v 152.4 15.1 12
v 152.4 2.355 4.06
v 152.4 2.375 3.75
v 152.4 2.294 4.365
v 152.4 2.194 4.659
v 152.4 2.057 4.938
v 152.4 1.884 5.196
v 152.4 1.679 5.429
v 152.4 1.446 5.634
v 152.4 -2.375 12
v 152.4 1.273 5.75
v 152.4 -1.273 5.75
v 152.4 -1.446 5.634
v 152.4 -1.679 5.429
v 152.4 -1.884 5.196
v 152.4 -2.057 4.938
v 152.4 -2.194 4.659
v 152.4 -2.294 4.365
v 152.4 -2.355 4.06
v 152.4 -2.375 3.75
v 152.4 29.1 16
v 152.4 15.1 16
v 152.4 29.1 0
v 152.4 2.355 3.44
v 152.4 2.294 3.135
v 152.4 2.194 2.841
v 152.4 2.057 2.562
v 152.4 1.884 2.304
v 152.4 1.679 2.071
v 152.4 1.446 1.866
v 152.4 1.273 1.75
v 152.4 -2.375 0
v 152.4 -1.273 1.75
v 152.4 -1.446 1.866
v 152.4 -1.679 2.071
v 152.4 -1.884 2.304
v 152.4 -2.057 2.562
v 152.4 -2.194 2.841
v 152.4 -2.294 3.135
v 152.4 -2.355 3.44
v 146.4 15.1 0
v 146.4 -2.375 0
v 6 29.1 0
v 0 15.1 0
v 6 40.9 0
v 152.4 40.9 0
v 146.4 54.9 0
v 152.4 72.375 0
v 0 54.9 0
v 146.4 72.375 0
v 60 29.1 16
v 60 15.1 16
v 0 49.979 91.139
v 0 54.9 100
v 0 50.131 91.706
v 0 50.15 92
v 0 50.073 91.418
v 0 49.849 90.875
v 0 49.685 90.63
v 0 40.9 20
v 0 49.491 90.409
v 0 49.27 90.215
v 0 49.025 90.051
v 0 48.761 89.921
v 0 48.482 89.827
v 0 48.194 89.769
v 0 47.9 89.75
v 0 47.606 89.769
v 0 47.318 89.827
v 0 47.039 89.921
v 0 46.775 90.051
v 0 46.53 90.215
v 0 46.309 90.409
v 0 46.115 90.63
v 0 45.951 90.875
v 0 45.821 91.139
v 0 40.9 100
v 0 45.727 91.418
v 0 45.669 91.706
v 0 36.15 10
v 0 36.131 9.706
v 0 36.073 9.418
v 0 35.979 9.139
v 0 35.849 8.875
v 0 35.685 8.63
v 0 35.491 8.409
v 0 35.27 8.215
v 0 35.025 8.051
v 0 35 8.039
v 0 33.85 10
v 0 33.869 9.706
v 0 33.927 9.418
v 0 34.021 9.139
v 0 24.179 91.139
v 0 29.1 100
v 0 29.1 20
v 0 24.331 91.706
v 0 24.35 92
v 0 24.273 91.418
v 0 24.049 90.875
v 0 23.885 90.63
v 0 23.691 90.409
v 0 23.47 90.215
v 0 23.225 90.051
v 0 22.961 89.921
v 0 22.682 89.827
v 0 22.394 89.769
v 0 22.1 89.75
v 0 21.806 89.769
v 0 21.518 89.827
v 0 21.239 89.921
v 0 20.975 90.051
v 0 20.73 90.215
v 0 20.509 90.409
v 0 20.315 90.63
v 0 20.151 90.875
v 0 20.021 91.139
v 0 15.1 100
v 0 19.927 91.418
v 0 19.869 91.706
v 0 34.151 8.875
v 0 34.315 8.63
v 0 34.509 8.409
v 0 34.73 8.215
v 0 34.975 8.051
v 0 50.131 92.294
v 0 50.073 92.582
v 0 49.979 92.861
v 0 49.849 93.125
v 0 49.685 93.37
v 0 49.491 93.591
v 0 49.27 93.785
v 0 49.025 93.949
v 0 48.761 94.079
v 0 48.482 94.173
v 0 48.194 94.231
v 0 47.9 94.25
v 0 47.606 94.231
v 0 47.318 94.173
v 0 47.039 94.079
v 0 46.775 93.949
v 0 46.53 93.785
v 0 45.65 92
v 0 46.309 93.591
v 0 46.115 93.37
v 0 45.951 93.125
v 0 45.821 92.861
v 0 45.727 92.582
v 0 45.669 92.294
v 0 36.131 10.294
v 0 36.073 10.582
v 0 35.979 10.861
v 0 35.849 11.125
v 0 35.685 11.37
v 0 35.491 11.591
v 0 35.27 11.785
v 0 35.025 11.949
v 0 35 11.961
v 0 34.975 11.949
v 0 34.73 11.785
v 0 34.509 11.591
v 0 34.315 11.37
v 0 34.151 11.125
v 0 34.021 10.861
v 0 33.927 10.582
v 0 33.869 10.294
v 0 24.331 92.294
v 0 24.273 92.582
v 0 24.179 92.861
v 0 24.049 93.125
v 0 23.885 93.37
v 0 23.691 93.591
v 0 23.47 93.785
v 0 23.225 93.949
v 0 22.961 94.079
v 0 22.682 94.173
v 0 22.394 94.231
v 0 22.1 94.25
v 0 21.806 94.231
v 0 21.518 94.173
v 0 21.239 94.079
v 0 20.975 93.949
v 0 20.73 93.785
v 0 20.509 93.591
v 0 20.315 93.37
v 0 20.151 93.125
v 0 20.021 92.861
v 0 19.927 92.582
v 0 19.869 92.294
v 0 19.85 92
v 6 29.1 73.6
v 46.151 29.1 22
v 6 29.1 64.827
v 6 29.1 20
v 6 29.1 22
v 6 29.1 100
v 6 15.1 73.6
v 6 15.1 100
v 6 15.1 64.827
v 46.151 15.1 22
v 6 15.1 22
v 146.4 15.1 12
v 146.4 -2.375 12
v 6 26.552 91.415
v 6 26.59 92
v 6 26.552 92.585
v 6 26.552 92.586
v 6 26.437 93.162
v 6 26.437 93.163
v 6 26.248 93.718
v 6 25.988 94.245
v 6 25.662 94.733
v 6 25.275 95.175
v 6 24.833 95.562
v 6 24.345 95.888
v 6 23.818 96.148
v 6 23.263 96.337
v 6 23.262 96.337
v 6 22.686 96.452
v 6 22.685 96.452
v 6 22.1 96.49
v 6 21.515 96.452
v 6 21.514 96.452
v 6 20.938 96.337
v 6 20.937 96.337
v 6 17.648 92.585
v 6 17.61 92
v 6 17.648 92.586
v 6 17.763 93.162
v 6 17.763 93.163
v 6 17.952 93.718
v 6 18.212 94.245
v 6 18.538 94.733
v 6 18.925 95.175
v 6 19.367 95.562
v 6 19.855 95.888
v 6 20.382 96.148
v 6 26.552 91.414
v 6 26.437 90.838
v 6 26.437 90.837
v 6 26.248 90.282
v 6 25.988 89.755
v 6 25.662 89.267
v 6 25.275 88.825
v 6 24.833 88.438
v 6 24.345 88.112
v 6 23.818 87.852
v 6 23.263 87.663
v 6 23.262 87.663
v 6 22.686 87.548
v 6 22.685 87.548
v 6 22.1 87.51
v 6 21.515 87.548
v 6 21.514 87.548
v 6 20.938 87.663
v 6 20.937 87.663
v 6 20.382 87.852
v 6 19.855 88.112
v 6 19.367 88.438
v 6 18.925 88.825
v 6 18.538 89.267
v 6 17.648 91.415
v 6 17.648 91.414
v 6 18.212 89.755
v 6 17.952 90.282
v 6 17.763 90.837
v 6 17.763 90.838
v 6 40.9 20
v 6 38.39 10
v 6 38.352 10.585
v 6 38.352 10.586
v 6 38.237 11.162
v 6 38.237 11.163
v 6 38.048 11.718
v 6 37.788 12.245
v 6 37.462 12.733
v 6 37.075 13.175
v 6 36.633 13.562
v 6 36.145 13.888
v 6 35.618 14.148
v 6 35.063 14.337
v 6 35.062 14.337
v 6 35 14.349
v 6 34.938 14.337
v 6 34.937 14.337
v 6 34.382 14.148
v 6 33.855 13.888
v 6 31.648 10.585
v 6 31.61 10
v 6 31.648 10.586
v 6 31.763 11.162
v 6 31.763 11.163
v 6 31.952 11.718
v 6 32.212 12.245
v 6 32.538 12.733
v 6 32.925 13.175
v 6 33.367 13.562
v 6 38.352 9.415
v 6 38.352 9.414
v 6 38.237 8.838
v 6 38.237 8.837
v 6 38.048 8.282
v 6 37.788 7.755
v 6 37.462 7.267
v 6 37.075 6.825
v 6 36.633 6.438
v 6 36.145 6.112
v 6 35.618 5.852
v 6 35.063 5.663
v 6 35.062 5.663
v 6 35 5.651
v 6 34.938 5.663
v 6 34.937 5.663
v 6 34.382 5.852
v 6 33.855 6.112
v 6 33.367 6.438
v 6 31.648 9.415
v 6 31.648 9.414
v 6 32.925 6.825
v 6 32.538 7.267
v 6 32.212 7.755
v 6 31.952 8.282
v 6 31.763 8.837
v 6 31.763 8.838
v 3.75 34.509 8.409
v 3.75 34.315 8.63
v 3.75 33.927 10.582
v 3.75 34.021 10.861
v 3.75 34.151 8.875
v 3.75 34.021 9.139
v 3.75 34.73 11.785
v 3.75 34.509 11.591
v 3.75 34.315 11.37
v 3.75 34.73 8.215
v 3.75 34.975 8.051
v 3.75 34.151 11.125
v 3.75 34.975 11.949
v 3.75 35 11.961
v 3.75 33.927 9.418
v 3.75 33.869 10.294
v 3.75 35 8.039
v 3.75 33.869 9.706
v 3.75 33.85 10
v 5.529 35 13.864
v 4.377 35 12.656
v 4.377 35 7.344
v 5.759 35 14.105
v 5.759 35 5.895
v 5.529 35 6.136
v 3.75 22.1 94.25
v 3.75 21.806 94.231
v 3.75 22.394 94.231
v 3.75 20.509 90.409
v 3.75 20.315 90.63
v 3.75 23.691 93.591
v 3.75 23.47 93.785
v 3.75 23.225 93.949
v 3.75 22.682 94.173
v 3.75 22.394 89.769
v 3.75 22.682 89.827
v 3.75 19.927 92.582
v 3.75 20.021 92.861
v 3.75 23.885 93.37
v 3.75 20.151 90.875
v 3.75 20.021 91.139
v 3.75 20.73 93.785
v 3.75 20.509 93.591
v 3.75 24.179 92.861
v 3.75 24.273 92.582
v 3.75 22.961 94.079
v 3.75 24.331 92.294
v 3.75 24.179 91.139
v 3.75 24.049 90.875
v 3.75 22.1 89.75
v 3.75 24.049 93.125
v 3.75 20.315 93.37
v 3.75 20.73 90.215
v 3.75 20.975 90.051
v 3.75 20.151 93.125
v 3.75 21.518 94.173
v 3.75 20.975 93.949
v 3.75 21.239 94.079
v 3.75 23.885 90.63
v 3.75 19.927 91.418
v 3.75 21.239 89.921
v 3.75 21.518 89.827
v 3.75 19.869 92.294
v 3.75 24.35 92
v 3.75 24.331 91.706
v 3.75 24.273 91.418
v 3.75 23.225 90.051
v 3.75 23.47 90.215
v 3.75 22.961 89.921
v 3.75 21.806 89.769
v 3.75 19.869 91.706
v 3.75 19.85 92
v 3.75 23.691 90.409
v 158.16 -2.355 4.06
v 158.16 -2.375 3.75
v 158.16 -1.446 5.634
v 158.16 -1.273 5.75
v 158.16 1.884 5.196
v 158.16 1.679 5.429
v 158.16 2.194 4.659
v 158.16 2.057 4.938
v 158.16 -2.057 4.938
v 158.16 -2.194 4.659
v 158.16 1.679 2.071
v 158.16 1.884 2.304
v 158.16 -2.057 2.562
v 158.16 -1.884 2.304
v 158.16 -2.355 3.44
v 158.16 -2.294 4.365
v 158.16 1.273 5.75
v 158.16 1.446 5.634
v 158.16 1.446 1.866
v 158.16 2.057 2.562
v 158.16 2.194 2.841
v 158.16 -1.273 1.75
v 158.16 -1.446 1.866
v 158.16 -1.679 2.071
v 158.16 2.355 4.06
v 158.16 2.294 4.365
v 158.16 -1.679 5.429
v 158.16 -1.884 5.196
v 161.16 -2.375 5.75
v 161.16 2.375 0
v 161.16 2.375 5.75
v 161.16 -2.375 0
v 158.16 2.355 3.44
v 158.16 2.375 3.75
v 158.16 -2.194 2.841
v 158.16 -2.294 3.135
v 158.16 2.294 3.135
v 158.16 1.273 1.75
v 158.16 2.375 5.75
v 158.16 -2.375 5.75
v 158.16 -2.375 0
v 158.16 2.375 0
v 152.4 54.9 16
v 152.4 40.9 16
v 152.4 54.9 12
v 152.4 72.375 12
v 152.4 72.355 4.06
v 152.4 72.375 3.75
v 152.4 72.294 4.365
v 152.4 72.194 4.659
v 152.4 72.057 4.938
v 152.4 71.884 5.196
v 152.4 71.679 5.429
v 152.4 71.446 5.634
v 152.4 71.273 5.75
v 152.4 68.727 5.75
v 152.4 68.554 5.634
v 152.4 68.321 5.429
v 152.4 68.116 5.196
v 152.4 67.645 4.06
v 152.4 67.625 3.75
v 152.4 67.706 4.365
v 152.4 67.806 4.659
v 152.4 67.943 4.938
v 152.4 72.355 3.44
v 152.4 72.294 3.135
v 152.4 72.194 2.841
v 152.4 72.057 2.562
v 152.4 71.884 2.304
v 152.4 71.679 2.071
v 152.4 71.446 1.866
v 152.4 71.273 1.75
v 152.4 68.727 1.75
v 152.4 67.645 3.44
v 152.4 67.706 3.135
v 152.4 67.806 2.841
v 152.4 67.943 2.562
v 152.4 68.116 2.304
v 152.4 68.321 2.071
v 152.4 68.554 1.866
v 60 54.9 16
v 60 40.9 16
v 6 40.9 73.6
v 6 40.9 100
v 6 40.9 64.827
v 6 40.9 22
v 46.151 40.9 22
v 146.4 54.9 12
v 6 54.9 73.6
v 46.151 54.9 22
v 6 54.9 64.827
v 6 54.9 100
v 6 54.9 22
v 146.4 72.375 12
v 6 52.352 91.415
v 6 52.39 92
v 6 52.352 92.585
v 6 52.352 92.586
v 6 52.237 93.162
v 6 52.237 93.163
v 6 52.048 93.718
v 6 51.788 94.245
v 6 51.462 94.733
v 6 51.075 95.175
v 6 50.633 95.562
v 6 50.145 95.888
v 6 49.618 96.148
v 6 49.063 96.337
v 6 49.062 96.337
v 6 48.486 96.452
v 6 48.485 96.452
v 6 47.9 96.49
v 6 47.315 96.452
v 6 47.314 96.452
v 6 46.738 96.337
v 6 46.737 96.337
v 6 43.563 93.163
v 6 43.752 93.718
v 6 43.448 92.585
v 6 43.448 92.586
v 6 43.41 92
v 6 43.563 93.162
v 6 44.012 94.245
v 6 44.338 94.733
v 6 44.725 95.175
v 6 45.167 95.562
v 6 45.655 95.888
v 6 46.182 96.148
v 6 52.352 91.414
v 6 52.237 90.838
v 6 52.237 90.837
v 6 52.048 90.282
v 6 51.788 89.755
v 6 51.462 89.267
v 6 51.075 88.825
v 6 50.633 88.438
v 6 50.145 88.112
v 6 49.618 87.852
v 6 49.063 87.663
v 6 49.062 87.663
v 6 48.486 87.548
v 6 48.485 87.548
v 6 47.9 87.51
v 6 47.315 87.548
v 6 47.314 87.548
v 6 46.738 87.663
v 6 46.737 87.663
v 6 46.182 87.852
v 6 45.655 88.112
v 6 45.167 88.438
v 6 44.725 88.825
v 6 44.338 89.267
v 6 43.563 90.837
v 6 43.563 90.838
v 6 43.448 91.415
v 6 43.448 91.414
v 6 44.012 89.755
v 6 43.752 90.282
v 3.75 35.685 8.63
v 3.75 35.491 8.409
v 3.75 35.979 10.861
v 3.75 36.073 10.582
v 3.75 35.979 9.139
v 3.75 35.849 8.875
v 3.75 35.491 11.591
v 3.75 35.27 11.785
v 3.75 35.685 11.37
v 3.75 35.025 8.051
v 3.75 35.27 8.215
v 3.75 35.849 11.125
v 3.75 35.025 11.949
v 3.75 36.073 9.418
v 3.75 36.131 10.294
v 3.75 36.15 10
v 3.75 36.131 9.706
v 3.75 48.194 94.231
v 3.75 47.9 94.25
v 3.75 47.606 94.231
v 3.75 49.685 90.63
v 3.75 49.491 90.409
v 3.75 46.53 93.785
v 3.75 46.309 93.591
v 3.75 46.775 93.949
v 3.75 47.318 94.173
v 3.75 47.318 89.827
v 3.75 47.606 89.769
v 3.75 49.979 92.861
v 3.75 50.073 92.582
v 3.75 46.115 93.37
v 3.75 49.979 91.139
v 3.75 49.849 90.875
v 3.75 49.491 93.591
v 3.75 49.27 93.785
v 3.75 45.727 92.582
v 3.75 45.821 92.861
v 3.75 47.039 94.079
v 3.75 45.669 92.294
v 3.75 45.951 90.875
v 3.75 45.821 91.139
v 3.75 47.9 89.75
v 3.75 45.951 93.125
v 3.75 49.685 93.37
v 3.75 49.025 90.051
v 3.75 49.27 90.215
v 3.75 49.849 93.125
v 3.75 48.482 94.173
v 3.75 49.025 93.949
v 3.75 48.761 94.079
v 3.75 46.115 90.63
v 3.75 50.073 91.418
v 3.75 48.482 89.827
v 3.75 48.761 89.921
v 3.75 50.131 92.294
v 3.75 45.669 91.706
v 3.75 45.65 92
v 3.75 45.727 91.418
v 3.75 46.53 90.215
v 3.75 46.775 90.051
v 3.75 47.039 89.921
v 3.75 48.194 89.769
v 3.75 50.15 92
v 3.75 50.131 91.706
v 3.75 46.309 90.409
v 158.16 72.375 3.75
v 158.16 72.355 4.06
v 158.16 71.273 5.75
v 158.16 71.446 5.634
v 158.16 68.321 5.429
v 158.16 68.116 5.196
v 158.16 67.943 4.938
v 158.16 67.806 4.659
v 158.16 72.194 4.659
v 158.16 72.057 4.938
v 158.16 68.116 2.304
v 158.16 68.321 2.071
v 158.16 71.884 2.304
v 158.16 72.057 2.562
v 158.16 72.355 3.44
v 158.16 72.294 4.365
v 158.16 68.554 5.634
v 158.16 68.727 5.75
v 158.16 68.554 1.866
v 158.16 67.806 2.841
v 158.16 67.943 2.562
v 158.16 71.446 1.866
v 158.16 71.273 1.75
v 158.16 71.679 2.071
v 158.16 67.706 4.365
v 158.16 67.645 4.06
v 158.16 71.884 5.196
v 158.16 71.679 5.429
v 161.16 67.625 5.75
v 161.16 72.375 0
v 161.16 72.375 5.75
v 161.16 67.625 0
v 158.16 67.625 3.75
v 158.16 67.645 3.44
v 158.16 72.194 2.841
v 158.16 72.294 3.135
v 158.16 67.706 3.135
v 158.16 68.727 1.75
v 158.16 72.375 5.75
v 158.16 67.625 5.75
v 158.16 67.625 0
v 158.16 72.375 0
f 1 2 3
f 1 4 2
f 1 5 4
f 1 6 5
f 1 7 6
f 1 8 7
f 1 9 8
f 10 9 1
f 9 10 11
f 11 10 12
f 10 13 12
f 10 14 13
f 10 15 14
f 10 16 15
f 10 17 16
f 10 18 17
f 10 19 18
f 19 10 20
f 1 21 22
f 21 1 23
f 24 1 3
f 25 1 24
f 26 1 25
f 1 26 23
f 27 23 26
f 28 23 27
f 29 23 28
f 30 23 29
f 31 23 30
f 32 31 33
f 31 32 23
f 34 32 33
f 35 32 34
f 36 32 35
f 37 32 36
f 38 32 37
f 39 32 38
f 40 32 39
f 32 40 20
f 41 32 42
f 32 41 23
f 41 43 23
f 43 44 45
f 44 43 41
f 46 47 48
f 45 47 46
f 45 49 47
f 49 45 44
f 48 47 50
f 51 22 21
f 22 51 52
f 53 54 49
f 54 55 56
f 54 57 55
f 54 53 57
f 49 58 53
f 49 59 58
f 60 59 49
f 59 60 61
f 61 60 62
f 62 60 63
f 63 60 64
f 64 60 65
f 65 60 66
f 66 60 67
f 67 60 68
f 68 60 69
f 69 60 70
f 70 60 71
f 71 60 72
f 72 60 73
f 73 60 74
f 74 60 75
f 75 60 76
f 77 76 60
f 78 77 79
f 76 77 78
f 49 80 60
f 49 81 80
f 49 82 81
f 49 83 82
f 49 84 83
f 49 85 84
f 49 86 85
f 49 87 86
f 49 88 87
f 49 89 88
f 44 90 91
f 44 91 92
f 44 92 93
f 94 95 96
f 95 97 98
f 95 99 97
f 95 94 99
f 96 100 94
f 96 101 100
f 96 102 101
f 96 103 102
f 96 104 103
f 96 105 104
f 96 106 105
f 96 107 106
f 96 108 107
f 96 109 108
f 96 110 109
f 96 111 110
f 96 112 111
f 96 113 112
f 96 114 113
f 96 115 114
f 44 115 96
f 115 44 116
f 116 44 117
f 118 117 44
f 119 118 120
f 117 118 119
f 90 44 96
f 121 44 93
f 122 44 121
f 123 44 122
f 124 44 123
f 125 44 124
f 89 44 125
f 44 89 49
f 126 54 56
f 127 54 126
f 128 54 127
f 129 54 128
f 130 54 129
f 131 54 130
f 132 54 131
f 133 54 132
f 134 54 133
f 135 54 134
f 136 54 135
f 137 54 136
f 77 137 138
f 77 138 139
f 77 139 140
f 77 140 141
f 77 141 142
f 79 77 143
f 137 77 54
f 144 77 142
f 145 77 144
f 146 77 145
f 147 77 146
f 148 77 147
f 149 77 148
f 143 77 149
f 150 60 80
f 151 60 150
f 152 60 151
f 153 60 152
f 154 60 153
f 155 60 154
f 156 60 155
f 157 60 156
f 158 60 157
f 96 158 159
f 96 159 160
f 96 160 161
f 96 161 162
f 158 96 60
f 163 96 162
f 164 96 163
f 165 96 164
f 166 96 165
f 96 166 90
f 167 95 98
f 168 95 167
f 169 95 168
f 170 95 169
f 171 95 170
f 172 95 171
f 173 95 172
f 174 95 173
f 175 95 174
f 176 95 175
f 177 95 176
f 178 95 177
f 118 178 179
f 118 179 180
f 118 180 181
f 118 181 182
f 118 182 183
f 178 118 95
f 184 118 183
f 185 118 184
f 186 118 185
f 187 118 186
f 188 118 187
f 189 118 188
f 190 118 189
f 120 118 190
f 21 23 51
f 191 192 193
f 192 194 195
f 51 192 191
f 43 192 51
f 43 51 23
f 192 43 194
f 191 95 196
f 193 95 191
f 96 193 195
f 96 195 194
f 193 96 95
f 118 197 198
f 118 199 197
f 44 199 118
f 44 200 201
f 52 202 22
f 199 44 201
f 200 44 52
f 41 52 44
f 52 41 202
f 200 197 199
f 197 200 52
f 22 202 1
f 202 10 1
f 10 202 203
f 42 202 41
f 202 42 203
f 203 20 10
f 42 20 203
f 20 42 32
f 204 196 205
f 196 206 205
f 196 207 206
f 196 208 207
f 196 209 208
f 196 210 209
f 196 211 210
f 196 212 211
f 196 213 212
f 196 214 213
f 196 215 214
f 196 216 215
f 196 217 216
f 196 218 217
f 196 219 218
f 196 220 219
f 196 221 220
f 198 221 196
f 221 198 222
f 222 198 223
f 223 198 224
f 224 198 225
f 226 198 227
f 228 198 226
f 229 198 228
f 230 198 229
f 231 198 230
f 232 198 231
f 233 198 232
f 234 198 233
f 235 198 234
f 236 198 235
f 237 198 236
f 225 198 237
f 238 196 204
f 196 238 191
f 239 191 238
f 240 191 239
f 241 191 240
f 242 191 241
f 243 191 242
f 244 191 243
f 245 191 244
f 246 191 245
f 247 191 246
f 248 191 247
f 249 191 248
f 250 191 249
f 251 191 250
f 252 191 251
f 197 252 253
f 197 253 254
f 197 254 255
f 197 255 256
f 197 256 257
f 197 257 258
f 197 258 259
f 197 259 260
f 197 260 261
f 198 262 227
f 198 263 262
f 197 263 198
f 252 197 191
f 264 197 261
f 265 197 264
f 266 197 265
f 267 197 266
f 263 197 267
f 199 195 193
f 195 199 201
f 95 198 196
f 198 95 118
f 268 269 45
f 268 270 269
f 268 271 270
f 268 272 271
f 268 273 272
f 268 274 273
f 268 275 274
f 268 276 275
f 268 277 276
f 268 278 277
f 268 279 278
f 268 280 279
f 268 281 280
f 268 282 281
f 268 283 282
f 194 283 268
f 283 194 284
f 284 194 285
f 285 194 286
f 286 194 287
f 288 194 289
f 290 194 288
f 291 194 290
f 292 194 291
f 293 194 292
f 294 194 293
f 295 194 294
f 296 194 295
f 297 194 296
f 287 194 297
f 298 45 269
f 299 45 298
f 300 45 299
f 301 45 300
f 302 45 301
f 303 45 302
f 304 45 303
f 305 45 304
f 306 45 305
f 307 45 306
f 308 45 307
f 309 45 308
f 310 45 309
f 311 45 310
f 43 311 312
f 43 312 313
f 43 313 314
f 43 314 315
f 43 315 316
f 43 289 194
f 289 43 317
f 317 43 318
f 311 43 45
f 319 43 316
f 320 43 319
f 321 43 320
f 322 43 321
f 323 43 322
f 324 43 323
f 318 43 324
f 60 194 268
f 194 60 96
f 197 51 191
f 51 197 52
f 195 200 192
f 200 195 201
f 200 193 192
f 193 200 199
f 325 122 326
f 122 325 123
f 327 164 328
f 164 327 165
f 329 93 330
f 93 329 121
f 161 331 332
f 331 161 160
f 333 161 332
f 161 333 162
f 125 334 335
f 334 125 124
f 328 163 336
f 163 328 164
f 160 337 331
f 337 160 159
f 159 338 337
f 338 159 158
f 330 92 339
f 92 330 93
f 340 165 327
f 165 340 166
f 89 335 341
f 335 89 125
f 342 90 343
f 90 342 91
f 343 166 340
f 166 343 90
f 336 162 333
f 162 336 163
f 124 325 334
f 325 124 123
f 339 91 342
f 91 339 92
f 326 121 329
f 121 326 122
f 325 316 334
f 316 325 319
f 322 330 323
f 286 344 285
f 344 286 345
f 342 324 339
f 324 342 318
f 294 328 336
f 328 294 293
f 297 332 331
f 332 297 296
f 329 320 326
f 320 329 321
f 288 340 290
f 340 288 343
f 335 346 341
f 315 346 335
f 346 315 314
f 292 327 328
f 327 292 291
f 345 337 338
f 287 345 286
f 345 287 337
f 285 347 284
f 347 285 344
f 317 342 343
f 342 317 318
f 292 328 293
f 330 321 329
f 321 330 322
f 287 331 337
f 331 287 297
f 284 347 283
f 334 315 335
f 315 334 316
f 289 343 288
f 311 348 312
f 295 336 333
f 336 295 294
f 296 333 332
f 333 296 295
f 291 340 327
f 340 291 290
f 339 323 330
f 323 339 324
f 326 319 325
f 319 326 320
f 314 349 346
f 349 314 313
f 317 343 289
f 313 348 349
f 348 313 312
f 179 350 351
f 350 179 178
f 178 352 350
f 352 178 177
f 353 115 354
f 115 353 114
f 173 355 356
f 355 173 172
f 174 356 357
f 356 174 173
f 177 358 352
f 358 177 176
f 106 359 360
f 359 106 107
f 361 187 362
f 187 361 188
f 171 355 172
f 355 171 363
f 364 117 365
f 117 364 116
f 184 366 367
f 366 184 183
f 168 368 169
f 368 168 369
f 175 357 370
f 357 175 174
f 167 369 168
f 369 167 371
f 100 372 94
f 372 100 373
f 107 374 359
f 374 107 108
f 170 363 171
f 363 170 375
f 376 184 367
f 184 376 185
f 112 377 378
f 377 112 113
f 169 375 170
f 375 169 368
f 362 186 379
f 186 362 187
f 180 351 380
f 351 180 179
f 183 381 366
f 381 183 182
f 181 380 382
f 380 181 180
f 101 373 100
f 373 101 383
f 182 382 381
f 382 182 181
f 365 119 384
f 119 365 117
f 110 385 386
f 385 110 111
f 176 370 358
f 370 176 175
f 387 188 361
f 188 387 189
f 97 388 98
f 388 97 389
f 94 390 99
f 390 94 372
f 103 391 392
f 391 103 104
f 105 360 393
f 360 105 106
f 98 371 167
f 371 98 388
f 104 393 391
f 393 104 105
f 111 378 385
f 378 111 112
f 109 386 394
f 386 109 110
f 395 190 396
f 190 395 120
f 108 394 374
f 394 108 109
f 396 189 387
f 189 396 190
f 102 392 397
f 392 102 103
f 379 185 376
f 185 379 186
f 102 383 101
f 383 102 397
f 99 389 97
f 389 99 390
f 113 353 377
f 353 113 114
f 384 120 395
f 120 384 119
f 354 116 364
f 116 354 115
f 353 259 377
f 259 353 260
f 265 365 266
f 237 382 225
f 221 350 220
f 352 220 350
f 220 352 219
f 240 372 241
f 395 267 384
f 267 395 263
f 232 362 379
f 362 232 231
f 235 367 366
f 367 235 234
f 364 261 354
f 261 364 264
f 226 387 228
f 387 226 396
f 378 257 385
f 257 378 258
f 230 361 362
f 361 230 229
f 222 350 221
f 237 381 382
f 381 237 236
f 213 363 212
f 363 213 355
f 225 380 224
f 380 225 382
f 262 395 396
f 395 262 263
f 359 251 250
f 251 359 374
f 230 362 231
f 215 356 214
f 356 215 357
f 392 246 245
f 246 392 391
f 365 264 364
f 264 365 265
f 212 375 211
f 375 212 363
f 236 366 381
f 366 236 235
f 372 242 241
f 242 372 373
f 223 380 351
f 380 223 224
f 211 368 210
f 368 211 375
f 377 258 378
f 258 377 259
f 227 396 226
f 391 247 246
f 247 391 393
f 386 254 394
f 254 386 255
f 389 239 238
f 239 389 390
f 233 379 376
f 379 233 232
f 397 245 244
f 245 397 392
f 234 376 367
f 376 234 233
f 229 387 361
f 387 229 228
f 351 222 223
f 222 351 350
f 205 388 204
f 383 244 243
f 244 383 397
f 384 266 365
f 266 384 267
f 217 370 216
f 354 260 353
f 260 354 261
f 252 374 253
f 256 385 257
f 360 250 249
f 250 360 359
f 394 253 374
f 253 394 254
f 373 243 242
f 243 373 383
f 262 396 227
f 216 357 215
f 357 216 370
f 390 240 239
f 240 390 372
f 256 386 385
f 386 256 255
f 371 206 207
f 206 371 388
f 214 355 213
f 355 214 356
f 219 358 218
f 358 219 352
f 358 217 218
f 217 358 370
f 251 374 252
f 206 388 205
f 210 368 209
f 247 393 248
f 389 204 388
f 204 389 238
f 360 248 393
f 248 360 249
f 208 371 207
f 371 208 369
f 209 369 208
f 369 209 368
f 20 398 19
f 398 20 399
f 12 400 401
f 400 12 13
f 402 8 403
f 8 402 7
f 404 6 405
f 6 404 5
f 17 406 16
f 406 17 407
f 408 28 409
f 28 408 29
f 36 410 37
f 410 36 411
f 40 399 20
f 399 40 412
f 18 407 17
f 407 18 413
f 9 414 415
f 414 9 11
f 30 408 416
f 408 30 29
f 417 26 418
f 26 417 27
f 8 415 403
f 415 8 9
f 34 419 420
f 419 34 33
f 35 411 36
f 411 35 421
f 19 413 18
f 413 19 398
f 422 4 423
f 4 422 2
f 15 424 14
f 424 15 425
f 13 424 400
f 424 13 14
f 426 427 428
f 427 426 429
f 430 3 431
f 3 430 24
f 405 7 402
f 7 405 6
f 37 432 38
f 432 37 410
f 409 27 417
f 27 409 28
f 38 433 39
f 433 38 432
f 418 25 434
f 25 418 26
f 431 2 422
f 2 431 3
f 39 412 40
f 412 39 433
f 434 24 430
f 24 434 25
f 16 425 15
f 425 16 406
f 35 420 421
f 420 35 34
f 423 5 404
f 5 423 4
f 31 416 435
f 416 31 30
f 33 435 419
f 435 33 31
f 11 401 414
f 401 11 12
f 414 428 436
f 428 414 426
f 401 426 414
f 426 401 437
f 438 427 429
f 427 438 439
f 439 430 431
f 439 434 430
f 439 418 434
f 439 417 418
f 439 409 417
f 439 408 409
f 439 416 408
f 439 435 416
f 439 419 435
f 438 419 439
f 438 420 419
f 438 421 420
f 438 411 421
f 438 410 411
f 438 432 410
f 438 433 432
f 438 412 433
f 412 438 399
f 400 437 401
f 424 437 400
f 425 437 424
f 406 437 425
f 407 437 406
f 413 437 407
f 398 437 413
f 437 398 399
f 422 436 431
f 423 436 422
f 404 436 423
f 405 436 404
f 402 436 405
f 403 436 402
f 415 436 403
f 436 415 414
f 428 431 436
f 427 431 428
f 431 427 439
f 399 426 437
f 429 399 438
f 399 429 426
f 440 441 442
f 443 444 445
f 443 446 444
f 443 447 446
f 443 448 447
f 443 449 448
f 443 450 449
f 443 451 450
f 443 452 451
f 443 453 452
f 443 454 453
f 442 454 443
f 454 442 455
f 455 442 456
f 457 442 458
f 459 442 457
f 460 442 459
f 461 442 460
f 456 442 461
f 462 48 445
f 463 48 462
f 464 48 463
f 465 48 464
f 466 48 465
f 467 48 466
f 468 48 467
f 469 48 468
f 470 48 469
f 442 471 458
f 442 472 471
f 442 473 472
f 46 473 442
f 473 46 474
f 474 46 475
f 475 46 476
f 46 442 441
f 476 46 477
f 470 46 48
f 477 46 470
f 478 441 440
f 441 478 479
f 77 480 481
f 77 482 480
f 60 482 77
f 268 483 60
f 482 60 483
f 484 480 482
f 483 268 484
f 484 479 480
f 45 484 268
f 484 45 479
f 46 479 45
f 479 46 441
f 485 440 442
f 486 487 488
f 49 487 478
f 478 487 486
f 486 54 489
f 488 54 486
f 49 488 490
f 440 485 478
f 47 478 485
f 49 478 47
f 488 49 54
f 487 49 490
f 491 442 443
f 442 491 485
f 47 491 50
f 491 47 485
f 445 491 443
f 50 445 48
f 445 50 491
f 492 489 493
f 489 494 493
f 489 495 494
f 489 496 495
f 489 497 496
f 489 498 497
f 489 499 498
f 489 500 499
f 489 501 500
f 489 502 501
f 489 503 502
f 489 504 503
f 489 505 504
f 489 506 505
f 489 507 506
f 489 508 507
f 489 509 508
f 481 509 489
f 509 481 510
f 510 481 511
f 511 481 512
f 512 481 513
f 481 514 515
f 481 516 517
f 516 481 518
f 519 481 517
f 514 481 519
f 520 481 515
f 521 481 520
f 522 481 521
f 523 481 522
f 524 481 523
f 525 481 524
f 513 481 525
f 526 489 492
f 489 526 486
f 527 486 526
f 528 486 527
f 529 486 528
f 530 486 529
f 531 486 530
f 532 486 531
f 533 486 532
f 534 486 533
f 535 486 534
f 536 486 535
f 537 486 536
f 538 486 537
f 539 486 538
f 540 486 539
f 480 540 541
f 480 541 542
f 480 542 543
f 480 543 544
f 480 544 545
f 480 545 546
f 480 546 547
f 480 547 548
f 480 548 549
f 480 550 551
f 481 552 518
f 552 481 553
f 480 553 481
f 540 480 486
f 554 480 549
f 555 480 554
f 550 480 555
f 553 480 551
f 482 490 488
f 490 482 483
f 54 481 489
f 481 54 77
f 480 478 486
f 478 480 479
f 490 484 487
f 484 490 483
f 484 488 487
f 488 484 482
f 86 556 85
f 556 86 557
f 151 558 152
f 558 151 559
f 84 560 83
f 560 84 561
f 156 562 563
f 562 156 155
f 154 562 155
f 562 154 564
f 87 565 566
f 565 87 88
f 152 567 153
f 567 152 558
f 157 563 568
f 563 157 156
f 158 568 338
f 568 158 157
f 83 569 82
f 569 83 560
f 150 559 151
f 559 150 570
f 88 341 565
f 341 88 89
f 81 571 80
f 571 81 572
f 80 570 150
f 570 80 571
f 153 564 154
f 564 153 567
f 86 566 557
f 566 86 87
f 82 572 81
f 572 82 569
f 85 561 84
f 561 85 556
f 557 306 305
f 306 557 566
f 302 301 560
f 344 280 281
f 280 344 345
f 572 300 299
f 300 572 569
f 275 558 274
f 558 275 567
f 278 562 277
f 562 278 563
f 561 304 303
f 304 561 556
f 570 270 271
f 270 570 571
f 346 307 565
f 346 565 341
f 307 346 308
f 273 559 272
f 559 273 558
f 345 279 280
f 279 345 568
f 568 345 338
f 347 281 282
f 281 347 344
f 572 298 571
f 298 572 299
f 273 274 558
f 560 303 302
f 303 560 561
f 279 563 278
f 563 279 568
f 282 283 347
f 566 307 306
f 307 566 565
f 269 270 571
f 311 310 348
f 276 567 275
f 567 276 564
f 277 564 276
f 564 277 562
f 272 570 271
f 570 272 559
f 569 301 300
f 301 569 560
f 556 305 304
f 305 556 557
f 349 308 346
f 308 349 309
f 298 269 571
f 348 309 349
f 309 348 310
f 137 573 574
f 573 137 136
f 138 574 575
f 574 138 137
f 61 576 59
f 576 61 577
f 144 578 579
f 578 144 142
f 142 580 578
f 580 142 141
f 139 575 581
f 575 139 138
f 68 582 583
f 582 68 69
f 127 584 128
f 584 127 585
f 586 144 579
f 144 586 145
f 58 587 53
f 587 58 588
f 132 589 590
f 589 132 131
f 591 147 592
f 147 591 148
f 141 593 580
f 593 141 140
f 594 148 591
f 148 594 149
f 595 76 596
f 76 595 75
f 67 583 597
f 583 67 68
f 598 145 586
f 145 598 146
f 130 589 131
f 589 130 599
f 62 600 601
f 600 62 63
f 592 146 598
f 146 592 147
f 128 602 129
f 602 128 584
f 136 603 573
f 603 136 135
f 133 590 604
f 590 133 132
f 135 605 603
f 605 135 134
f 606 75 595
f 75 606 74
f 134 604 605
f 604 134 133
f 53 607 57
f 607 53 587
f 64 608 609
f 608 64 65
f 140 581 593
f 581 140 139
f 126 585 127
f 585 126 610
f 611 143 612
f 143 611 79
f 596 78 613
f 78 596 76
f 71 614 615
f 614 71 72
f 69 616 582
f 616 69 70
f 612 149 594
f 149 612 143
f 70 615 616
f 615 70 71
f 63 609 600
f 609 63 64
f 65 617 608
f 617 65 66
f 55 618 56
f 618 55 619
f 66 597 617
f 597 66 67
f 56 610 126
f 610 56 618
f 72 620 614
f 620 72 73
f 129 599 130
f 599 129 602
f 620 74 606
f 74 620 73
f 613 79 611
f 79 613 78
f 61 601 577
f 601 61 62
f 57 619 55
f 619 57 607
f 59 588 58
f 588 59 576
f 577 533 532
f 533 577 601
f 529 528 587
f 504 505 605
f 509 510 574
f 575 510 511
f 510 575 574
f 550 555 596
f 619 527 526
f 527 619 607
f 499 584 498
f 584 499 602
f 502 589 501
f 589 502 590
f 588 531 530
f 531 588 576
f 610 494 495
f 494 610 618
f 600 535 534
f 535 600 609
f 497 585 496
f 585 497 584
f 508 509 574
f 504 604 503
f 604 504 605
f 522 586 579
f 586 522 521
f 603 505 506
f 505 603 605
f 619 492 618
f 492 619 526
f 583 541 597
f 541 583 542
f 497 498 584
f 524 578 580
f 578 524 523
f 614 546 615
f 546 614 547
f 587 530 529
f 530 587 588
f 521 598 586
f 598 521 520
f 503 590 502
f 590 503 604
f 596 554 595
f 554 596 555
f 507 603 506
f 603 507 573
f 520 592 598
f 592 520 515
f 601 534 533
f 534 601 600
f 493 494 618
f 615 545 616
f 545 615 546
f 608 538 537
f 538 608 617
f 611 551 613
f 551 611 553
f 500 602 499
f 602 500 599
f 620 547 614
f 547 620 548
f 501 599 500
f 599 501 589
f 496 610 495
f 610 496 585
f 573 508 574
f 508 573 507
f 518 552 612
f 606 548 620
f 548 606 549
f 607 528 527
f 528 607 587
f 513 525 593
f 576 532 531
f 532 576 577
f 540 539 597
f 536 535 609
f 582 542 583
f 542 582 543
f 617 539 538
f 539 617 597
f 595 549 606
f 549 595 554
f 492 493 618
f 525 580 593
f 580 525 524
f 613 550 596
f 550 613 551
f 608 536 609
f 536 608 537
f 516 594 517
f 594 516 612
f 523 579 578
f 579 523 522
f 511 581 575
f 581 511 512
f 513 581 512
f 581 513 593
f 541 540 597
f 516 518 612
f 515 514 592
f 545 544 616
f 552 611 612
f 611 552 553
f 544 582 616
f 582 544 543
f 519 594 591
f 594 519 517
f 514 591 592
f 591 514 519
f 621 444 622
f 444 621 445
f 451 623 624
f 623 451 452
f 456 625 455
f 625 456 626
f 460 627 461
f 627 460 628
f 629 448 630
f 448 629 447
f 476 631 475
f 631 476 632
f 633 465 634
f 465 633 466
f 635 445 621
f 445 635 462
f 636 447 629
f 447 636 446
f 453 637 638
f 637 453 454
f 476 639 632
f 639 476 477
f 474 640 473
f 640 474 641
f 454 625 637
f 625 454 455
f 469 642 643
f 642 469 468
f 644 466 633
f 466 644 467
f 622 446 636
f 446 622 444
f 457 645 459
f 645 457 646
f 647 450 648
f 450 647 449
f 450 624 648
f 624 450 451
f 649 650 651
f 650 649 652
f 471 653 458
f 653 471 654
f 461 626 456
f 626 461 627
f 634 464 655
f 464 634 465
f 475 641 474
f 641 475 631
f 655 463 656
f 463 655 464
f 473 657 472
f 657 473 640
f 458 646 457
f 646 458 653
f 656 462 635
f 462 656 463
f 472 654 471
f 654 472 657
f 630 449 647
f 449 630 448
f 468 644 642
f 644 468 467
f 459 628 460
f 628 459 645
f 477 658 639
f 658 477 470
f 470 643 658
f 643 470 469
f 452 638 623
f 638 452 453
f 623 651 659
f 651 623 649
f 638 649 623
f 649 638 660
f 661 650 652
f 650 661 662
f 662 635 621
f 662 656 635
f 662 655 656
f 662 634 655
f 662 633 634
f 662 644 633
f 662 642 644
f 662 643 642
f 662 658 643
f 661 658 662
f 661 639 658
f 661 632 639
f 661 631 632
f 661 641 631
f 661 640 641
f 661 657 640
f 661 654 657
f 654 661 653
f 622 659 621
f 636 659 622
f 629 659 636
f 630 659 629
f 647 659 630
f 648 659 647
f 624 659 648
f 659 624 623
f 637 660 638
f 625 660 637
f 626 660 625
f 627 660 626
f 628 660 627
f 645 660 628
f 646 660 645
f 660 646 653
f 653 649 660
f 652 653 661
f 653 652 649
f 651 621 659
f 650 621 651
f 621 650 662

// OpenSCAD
// Standoff hanger for the flip-counter board.
// Two brackets (left + right) screw to the wall and hold the board
// 6" out from it by pins through the board's two existing corner holes.
// The long arms run just outside the board's side edges so cards
// flipping over the rings never touch them.
// All dimensions in mm.

/* [Board] */
board_w       = 288.9;   // 11 3/8"
board_h       = 168.3;   // 6 5/8"
hole_spacing  = 264.7;   // ~10 7/16" center-to-center
hole_d        = 6.35;    // 1/4"
board_t       = 4.76;    // 3/16"
hole_from_top = 11;      // only used for the assembly preview

/* [Bracket] */
standoff      = 152.4;   // wall to back face of board (6")
edge_gap      = 3;       // arm clearance outside the board edge
arm_w         = 14;      // arm width
arm_h         = 16;      // arm height
pad_t         = 6;       // pad behind the board that carries the pin
pad_h         = 12;
plate_t       = 6;       // wall plate thickness
plate_drop    = 100;     // plate length below the top face
tab_w         = 14;      // outer tab for the upper screw
tab_h         = 20;
gusset_reach  = 60;      // brace meets the arm here (keeps it >45 deg)
gusset_drop   = 80;
web           = 6;       // brace member thickness
screw_d       = 4.5;     // #8 screw clearance
screw_head_d  = 9;

/* [Pin] */
pin_d         = hole_d - 1.6;              // loose fit in the hole
pin_h         = 4.0;                       // flats top and bottom
pin_len       = board_t + 1.0;             // pad face to retaining nub
nub_rise      = hole_d - 0.6 - pin_h;      // lift the board this much to remove
nub_len       = 3;

$fn = 48;

// Model coords (right-hand bracket): x = out from wall, y = outward along
// the board, z = up. Hole/pin center at y = 0, z = 0.
edge   = (board_w - hole_spacing) / 2;     // hole center to board edge
ztop   = pin_h/2 + nub_rise;               // shared top face = print bed
arm_y0 = edge + edge_gap;
arm_y1 = arm_y0 + arm_w;

module brace_2d() {
    tri = [[0, -arm_h], [gusset_reach, -arm_h], [0, -gusset_drop]];
    difference() {
        polygon(tri);
        offset(delta = -web) polygon(tri);
    }
}

module screw_hole(y, z) {
    translate([-1, y, z]) rotate([0, 90, 0]) {
        cylinder(d = screw_d, h = plate_t + 2);
        // countersink on the front face
        translate([0, 0, plate_t + 1 - (screw_head_d - screw_d)/2])
            cylinder(d1 = screw_d, d2 = screw_head_d, h = (screw_head_d - screw_d)/2 + 0.01);
    }
}

module pin() {
    intersection() {
        // starts 1 mm inside the pad so it fuses into one solid
        translate([standoff - 1, 0, 0]) rotate([0, 90, 0])
            cylinder(d = pin_d, h = pin_len + nub_len + 1);
        translate([standoff - 1, -pin_d, -pin_h/2]) cube([pin_len + nub_len + 1, 2*pin_d, pin_h]);
    }
    // retaining nub: board drops behind it under its own weight
    translate([standoff + pin_len, -pin_d/2, -pin_h/2])
        cube([nub_len, pin_d, ztop + pin_h/2]);
}

module bracket() {
    difference() {
        union() {
            // arm, outside the board edge
            translate([0, arm_y0, ztop - arm_h]) cube([standoff, arm_w, arm_h]);
            // pad behind the board corner, from the pin out to the arm
            translate([standoff - pad_t, -pin_d/2, ztop - pad_h])
                cube([pad_t, arm_y1 + pin_d/2, pad_h]);
            // wall plate + outer tab
            translate([0, arm_y0, ztop - plate_drop]) cube([plate_t, arm_w, plate_drop]);
            translate([0, arm_y0, ztop - tab_h]) cube([plate_t, arm_w + tab_w, tab_h]);
            // open triangular brace under the arm
            translate([0, arm_y1, ztop]) rotate([90, 0, 0]) linear_extrude(arm_w) brace_2d();
        }
        screw_hole(arm_y1 + tab_w/2, ztop - tab_h/2);
        screw_hole((arm_y0 + arm_y1)/2, ztop - plate_drop + 8);
    }
    pin();
}

module bracket_right() { bracket(); }
module bracket_left()  { mirror([0, 1, 0]) bracket(); }

// Print pose: upside down, so the shared top face sits on the bed.
// No supports needed (the pin bridges ~6 mm from pad to nub).
module print_pose() { translate([0, 0, ztop]) rotate([180, 0, 0]) children(); }

part = "both"; // [left, right, both, assembly]

if (part == "left")  print_pose() bracket_left();
if (part == "right") print_pose() bracket_right();
if (part == "both") {
    print_pose() bracket_left();
    translate([0, 70, 0]) print_pose() bracket_right();
}
if (part == "assembly") {
    // wall at x=0, viewed from the front +y is the right-hand side
    color("tan") translate([standoff, -board_w/2, -(board_h - hole_from_top)])
        difference() {
            cube([board_t, board_w, board_h]);
            for (s = [-1, 1]) translate([-1, board_w/2 + s*hole_spacing/2, board_h - hole_from_top])
                rotate([0, 90, 0]) cylinder(d = hole_d, h = board_t + 2);
        }
    color("steelblue") {
        translate([0,  hole_spacing/2, 0]) bracket_right();
        translate([0, -hole_spacing/2, 0]) bracket_left();
    }
    color("#ddd", 0.4) translate([-2, -220, -150]) cube([2, 440, 220]);
}

echo(str("Upper screws apart: ", hole_spacing + 2*(arm_y1 + tab_w/2), " mm, ",
         ztop - tab_h/2, " mm from pin center"));
echo(str("Lower screws apart: ", hole_spacing + (arm_y0 + arm_y1), " mm, ",
         ztop - plate_drop + 8, " mm from pin center"));
